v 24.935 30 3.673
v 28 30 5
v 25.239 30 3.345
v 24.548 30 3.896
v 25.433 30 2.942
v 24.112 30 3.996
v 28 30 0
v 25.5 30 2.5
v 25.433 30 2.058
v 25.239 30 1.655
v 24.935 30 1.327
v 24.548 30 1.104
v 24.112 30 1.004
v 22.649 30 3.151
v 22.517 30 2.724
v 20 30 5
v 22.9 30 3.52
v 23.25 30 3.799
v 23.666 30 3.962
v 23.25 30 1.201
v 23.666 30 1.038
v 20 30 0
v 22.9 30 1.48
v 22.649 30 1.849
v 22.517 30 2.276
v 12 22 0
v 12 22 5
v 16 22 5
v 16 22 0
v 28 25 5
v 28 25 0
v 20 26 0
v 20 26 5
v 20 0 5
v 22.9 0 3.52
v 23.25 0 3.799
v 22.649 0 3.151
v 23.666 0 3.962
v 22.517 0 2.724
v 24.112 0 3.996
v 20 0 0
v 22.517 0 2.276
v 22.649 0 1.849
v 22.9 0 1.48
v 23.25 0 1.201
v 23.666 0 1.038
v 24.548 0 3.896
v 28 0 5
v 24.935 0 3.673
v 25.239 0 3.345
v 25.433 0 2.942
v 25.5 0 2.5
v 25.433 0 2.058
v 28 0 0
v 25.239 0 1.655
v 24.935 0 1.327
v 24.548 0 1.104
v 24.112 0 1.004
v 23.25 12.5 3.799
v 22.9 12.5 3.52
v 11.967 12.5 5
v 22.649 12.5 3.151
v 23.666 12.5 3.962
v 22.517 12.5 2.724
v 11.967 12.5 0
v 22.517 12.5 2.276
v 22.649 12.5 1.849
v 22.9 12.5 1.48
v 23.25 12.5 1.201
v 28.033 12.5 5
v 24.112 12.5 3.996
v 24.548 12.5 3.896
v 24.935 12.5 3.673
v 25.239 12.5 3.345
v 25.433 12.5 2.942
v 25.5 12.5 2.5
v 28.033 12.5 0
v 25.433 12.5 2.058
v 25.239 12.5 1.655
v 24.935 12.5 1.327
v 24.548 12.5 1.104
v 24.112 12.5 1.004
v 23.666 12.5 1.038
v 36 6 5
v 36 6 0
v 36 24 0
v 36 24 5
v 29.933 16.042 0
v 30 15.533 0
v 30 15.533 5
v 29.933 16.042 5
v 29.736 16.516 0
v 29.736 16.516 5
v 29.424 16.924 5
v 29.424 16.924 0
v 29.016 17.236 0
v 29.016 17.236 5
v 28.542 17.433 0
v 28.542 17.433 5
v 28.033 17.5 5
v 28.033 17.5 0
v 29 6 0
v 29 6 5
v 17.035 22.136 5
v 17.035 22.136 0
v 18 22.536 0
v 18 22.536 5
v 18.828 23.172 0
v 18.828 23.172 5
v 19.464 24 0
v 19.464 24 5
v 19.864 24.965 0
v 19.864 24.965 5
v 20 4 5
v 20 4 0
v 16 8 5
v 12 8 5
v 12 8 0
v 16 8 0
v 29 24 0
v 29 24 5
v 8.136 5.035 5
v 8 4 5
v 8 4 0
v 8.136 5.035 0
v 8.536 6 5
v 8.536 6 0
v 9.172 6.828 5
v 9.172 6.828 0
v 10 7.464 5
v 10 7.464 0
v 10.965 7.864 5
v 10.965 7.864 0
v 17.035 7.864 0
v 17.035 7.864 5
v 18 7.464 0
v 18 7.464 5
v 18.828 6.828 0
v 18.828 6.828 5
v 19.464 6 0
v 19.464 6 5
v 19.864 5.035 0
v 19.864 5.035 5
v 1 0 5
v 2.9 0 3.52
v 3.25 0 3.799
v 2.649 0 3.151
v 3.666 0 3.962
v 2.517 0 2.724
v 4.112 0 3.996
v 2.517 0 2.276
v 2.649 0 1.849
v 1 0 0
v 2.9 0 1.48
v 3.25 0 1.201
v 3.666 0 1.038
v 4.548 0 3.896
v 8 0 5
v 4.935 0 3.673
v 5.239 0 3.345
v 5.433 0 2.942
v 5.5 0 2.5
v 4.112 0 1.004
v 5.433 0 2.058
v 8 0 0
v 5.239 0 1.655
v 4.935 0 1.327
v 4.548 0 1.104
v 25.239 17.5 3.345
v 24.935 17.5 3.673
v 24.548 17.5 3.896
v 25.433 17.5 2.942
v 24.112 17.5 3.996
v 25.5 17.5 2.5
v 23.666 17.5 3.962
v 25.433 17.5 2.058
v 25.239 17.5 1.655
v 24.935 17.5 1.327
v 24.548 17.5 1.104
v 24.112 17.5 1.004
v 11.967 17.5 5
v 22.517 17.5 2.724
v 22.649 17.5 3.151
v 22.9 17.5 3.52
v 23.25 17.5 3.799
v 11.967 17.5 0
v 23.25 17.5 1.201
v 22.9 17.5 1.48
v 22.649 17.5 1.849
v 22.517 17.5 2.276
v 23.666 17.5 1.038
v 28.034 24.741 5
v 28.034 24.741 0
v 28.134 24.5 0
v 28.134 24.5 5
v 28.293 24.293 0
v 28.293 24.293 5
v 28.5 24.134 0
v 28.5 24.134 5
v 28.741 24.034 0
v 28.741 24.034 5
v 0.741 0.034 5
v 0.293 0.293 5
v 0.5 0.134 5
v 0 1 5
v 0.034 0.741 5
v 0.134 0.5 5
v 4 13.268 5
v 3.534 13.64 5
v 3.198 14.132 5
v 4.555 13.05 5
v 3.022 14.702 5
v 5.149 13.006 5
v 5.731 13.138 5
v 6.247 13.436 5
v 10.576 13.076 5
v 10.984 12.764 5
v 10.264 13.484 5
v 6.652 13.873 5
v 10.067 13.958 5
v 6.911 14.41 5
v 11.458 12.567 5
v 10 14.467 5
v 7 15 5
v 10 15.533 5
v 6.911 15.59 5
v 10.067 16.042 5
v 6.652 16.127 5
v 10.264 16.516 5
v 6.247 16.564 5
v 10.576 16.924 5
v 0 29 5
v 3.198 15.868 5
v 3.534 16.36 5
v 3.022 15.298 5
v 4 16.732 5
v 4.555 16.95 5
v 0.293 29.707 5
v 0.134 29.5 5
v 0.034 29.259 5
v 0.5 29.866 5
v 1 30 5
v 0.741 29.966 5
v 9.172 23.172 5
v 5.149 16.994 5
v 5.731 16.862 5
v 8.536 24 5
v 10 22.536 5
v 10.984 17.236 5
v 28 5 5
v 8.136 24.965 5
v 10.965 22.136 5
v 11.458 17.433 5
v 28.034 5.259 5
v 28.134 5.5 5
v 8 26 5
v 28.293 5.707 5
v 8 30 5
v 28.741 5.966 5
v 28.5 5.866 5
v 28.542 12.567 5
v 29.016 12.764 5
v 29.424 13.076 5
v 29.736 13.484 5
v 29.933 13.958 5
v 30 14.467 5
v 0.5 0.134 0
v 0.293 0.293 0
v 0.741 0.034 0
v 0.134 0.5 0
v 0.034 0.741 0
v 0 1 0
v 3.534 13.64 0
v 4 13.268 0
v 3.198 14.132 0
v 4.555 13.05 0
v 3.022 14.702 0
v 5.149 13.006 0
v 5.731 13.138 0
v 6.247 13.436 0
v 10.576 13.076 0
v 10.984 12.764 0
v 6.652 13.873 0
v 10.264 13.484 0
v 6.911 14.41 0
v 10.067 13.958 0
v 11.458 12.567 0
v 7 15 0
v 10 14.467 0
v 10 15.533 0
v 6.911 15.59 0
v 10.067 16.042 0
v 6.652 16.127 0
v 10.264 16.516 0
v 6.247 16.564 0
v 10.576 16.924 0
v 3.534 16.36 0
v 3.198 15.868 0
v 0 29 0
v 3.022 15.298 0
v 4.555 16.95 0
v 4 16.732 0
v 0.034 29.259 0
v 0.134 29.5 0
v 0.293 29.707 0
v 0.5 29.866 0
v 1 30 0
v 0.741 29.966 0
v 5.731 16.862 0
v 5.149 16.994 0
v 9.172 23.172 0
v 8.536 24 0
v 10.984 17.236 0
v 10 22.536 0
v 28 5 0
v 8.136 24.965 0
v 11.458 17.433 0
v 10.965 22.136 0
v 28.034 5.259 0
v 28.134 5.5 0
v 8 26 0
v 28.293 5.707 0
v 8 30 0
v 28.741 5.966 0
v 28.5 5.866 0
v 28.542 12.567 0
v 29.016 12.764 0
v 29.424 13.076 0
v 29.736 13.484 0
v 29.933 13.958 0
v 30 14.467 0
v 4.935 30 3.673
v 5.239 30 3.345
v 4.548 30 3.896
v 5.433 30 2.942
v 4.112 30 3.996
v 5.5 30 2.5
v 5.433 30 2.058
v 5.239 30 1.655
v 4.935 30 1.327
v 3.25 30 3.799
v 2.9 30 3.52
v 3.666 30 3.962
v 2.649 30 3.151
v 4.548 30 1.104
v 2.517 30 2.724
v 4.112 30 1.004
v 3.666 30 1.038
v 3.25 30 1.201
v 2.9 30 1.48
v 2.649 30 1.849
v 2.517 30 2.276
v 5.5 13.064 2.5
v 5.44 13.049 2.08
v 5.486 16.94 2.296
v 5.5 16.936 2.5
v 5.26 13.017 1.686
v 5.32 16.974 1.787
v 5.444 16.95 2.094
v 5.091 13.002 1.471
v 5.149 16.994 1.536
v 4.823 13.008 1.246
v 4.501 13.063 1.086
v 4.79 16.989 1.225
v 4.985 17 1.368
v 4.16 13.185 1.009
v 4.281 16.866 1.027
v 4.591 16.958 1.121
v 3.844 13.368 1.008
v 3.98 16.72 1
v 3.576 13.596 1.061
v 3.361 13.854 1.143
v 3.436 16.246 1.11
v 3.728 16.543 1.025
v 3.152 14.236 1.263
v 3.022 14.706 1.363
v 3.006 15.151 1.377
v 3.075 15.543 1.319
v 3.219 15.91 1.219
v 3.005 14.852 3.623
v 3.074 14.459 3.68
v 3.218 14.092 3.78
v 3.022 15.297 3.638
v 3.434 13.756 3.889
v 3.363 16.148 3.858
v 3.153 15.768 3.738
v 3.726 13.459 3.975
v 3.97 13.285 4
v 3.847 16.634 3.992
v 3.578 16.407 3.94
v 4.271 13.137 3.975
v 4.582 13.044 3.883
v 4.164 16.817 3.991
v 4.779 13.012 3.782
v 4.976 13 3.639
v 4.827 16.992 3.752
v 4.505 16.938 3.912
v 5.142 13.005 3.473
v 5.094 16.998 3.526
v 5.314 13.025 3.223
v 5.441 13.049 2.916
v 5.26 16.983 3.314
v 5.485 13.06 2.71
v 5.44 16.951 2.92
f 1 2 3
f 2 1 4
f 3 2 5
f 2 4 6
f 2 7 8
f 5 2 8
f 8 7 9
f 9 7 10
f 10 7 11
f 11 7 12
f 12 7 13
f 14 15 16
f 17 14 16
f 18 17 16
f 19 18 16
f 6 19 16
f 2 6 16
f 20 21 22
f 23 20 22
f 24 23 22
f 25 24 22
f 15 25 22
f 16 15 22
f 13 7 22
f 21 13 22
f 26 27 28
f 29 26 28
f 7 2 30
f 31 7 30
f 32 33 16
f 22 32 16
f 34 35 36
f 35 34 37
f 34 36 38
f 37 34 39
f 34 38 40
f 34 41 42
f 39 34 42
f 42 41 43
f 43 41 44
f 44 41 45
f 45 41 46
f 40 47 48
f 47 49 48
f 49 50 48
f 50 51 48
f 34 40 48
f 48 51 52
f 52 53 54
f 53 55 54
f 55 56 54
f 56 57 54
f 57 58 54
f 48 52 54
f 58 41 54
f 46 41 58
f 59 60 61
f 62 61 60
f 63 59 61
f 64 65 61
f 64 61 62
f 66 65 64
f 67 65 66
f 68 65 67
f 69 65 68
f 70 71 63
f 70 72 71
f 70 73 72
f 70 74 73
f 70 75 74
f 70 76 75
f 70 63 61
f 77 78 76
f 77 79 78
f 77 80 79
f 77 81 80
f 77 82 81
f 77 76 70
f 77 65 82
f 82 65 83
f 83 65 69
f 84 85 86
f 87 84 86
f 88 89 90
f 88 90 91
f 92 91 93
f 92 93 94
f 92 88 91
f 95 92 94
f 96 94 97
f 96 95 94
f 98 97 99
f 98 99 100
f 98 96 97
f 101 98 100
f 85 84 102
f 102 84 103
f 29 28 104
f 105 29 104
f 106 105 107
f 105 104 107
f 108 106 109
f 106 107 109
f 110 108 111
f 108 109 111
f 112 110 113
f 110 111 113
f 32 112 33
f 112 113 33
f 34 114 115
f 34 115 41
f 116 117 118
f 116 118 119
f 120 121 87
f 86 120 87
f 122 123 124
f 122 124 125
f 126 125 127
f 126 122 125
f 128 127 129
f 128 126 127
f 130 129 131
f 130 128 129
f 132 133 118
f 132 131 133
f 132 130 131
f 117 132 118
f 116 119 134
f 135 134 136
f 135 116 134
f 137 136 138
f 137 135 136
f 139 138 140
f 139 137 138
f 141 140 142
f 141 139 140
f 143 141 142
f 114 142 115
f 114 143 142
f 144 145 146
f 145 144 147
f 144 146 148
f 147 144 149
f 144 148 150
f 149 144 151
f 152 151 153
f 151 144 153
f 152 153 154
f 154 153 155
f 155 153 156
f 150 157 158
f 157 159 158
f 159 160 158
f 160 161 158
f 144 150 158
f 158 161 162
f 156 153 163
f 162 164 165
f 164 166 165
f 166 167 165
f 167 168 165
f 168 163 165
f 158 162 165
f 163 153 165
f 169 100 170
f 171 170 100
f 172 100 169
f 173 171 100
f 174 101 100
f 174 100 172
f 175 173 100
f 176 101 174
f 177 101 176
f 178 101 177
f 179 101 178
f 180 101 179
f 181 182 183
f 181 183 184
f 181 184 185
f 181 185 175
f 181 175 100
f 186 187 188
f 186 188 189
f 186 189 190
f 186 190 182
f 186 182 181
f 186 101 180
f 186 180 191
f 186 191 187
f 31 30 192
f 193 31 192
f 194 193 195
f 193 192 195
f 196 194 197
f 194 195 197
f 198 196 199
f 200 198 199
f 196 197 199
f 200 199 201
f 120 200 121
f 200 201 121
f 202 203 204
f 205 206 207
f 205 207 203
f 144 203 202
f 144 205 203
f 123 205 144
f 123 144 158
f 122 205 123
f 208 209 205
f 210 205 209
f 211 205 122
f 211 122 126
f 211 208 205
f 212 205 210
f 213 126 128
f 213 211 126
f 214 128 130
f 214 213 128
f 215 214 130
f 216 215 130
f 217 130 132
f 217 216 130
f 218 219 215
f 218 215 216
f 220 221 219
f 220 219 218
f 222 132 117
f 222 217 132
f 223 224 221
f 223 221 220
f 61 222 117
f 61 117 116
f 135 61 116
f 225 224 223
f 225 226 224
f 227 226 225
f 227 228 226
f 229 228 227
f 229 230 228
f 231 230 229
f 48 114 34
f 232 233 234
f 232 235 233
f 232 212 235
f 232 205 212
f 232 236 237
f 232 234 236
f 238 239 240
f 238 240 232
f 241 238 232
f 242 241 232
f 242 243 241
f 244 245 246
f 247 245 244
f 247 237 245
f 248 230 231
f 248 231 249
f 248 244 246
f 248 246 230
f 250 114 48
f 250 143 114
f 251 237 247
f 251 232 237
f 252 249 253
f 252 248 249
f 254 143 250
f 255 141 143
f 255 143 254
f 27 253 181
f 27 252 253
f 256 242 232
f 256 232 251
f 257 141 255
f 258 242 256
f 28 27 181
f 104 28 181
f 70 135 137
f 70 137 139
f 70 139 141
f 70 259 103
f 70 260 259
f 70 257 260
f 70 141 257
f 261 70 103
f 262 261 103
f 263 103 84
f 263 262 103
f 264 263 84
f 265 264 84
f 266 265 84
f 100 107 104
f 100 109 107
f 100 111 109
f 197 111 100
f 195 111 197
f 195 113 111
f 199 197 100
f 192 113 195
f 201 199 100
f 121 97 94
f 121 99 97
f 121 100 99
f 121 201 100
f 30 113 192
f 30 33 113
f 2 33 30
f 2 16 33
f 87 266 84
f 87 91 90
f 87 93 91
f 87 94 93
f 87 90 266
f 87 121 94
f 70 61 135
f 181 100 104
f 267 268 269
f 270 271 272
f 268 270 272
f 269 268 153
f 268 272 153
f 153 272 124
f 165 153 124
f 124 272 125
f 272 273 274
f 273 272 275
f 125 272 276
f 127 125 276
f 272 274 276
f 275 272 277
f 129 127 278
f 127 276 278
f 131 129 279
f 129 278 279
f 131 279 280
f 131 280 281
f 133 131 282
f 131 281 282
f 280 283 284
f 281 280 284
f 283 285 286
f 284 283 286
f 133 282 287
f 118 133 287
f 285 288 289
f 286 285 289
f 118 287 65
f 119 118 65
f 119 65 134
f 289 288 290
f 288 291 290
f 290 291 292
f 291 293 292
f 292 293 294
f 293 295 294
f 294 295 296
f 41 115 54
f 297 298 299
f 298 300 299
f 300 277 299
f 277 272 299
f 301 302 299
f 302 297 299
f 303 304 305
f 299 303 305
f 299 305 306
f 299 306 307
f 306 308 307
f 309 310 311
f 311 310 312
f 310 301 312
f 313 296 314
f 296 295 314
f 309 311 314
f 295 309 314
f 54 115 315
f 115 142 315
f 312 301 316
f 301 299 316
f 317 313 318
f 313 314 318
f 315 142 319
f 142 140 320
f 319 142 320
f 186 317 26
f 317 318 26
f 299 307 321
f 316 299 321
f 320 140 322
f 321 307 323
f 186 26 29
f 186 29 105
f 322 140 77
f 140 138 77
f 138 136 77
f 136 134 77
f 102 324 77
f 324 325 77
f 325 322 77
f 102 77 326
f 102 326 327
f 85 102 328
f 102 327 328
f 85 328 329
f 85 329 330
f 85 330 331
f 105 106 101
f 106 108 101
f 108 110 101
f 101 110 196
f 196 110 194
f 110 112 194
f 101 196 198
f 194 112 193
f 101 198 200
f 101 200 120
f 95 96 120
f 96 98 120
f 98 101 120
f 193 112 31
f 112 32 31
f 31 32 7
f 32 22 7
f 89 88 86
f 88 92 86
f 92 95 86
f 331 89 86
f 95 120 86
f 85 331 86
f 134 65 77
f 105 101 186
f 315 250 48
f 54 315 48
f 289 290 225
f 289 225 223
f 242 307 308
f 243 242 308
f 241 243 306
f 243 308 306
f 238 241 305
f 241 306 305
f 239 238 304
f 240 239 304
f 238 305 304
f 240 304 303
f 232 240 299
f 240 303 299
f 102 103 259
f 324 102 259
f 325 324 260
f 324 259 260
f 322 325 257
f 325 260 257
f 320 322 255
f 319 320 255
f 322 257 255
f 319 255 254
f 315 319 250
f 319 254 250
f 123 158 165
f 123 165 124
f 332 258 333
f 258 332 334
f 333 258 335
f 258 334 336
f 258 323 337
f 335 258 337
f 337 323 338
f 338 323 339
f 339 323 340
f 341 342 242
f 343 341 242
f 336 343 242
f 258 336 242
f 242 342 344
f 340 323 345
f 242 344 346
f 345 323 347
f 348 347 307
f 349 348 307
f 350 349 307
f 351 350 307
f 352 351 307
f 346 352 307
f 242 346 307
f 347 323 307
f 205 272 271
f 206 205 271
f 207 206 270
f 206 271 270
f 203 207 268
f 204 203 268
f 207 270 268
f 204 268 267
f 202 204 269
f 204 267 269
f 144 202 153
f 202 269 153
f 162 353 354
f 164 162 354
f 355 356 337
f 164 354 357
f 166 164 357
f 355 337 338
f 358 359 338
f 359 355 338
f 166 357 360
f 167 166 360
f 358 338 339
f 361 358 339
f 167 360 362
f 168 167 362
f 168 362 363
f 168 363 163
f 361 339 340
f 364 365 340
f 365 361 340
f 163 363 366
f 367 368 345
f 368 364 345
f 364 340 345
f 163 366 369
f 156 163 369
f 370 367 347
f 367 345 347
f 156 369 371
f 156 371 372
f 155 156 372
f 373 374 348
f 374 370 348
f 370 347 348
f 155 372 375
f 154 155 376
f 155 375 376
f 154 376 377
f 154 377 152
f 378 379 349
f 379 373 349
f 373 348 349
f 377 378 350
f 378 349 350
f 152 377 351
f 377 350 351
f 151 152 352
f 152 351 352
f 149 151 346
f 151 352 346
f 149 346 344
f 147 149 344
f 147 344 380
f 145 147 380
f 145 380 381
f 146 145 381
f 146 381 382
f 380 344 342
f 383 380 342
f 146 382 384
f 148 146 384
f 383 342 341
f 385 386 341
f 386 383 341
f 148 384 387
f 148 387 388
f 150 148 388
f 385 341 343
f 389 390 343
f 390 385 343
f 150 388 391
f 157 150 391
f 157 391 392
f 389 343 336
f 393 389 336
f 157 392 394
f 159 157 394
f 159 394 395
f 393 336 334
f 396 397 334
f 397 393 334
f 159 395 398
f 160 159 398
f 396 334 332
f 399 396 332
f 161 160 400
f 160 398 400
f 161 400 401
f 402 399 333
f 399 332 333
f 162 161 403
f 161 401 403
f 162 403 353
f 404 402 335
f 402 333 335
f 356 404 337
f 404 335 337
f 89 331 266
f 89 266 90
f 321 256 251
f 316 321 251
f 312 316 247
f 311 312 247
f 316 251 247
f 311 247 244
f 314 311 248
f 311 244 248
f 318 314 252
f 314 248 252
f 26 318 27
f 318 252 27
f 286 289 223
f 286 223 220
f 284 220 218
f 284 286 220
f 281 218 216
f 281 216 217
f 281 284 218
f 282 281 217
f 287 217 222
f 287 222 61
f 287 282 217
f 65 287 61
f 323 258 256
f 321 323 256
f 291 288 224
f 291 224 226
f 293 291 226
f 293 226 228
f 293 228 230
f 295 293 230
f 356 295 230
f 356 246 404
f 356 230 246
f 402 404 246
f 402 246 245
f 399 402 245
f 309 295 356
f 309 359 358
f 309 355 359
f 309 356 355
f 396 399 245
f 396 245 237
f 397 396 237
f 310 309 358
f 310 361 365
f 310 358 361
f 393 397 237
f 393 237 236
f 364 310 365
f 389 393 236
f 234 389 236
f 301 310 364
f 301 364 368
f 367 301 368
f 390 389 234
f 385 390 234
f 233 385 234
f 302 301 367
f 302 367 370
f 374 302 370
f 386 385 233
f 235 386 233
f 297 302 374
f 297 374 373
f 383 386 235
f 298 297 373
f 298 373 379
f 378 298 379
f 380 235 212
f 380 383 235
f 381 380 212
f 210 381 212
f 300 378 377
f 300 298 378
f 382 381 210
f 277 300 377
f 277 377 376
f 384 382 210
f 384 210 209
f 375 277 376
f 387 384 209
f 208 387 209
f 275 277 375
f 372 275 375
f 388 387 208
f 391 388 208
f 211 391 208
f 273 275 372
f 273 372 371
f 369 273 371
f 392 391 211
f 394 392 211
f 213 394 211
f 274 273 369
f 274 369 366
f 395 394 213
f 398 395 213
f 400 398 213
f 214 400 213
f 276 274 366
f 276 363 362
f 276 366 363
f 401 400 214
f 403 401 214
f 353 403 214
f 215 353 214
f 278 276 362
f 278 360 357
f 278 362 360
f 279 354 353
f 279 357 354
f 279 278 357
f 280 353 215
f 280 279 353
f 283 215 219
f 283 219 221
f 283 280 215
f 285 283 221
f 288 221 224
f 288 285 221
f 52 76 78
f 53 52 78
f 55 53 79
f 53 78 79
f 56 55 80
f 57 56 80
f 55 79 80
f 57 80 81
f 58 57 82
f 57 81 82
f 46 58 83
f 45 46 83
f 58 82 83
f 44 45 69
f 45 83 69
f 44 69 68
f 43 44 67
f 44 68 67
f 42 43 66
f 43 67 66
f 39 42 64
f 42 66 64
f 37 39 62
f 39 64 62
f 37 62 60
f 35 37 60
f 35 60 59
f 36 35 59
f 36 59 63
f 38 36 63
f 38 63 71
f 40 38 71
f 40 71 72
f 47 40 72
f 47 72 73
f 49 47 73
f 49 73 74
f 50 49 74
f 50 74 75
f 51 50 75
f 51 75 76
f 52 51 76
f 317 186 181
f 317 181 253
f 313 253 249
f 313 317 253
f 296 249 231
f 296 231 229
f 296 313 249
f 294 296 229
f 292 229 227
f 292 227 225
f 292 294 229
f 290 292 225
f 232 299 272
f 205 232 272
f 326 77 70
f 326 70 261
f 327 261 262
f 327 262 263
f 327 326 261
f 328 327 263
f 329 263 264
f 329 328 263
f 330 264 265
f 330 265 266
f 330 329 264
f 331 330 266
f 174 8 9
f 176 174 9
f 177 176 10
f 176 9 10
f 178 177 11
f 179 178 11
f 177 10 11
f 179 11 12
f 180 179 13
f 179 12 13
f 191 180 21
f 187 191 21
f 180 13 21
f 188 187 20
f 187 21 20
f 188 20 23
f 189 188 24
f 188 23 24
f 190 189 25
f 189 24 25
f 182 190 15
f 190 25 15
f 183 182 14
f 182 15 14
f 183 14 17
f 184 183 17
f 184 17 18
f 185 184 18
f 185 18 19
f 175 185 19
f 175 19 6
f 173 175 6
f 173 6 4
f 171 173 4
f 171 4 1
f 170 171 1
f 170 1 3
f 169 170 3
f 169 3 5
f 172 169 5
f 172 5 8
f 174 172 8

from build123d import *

# Parameters (mm, degrees)
SKETCH1_R           = 2
BOSS_EXTRUDE1_DEPTH = 5
SKETCH2_R           = 1.5
CUT_EXTRUDE1_DEPTH  = 31
CUT_EXTRUDE2_DEPTH  = 6.0000001


with BuildPart() as part:
    # Sketch1 → Boss-Extrude1 (new body)
    with BuildSketch(Plane.XY):
        with BuildLine():
            Line((1, 0), (35, 0))
            ThreePointArc((35, 0), (35.707106781, 0.292893219), (36, 1))
            Line((36, 1), (36, 29))
            ThreePointArc((36, 29), (35.707106781, 29.707106781), (35, 30))
            Line((35, 30), (1, 30))
            ThreePointArc((1, 30), (0.292893219, 29.707106781), (0, 29))
            Line((0, 29), (0, 7))
            Line((0, 7), (0, 1))
            ThreePointArc((0, 1), (0.292893219, 0.292893219), (1, 0))
        make_face()
        with Locations((5, 15)):
            Circle(SKETCH1_R, mode=Mode.SUBTRACT)
        with BuildLine():
            Line((11.967452223, 12.5), (28.032547777, 12.5))
            ThreePointArc((28.032547777, 12.5), (29.423746586, 13.076253414), (30, 14.467452223))
            Line((30, 14.467452223), (30, 15.532547777))
            ThreePointArc((30, 15.532547777), (29.423746586, 16.923746586), (28.032547777, 17.5))
            Line((28.032547777, 17.5), (11.967452223, 17.5))
            ThreePointArc((11.967452223, 17.5), (10.576253414, 16.923746586), (10, 15.532547777))
            Line((10, 15.532547777), (10, 14.467452223))
            ThreePointArc((10, 14.467452223), (10.576253414, 13.076253414), (11.967452223, 12.5))
        make_face(mode=Mode.SUBTRACT)
    extrude(amount=BOSS_EXTRUDE1_DEPTH)

    # Sketch2 → Cut-Extrude1 (cut, through all)
    with BuildSketch(Plane(origin=(0, 30, 0), x_dir=(1, 0, 0), z_dir=(0, 1, 0))):
        with Locations((4, -2.5)):
            Circle(SKETCH2_R)
        with Locations((24, -2.5)):
            Circle(SKETCH2_R)
    extrude(amount=-CUT_EXTRUDE1_DEPTH, mode=Mode.SUBTRACT)

    # Sketch3 → Cut-Extrude2 (cut, through all)
    with BuildSketch(Plane.XY.offset(5)):
        with BuildLine():
            Line((28, 30), (28, 25))
            ThreePointArc((28, 25), (28.292893219, 24.292893219), (29, 24))
            Line((29, 24), (43, 24))
            ThreePointArc((43, 24), (43.707106781, 23.707106781), (44, 23))
            Line((44, 23), (44, 7))
            ThreePointArc((44, 7), (43.707106781, 6.292893219), (43, 6))
            Line((43, 6), (29, 6))
            ThreePointArc((29, 6), (28.292893219, 5.707106781), (28, 5))
            Line((28, 5), (28, 0))
            Line((28, 0), (56.755309453, 0))
            Line((56.755309453, 0), (56.755309453, 30))
            Line((56.755309453, 30), (28, 30))
        make_face()
        with BuildLine():
            Line((8, 30), (8, 26))
            ThreePointArc((8, 26), (9.171572875, 23.171572875), (12, 22))
            Line((12, 22), (16, 22))
            ThreePointArc((16, 22), (18.828427125, 23.171572875), (20, 26))
            Line((20, 26), (20, 30))
            Line((20, 30), (8, 30))
        make_face()
        with BuildLine():
            Line((8, 0), (8, 4))
            ThreePointArc((8, 4), (9.171572875, 6.828427125), (12, 8))
            Line((12, 8), (16, 8))
            ThreePointArc((16, 8), (18.828427125, 6.828427125), (20, 4))
            Line((20, 4), (20, 0))
            Line((20, 0), (8, 0))
        make_face()
    extrude(amount=-CUT_EXTRUDE2_DEPTH, mode=Mode.SUBTRACT)


solid = part.part
